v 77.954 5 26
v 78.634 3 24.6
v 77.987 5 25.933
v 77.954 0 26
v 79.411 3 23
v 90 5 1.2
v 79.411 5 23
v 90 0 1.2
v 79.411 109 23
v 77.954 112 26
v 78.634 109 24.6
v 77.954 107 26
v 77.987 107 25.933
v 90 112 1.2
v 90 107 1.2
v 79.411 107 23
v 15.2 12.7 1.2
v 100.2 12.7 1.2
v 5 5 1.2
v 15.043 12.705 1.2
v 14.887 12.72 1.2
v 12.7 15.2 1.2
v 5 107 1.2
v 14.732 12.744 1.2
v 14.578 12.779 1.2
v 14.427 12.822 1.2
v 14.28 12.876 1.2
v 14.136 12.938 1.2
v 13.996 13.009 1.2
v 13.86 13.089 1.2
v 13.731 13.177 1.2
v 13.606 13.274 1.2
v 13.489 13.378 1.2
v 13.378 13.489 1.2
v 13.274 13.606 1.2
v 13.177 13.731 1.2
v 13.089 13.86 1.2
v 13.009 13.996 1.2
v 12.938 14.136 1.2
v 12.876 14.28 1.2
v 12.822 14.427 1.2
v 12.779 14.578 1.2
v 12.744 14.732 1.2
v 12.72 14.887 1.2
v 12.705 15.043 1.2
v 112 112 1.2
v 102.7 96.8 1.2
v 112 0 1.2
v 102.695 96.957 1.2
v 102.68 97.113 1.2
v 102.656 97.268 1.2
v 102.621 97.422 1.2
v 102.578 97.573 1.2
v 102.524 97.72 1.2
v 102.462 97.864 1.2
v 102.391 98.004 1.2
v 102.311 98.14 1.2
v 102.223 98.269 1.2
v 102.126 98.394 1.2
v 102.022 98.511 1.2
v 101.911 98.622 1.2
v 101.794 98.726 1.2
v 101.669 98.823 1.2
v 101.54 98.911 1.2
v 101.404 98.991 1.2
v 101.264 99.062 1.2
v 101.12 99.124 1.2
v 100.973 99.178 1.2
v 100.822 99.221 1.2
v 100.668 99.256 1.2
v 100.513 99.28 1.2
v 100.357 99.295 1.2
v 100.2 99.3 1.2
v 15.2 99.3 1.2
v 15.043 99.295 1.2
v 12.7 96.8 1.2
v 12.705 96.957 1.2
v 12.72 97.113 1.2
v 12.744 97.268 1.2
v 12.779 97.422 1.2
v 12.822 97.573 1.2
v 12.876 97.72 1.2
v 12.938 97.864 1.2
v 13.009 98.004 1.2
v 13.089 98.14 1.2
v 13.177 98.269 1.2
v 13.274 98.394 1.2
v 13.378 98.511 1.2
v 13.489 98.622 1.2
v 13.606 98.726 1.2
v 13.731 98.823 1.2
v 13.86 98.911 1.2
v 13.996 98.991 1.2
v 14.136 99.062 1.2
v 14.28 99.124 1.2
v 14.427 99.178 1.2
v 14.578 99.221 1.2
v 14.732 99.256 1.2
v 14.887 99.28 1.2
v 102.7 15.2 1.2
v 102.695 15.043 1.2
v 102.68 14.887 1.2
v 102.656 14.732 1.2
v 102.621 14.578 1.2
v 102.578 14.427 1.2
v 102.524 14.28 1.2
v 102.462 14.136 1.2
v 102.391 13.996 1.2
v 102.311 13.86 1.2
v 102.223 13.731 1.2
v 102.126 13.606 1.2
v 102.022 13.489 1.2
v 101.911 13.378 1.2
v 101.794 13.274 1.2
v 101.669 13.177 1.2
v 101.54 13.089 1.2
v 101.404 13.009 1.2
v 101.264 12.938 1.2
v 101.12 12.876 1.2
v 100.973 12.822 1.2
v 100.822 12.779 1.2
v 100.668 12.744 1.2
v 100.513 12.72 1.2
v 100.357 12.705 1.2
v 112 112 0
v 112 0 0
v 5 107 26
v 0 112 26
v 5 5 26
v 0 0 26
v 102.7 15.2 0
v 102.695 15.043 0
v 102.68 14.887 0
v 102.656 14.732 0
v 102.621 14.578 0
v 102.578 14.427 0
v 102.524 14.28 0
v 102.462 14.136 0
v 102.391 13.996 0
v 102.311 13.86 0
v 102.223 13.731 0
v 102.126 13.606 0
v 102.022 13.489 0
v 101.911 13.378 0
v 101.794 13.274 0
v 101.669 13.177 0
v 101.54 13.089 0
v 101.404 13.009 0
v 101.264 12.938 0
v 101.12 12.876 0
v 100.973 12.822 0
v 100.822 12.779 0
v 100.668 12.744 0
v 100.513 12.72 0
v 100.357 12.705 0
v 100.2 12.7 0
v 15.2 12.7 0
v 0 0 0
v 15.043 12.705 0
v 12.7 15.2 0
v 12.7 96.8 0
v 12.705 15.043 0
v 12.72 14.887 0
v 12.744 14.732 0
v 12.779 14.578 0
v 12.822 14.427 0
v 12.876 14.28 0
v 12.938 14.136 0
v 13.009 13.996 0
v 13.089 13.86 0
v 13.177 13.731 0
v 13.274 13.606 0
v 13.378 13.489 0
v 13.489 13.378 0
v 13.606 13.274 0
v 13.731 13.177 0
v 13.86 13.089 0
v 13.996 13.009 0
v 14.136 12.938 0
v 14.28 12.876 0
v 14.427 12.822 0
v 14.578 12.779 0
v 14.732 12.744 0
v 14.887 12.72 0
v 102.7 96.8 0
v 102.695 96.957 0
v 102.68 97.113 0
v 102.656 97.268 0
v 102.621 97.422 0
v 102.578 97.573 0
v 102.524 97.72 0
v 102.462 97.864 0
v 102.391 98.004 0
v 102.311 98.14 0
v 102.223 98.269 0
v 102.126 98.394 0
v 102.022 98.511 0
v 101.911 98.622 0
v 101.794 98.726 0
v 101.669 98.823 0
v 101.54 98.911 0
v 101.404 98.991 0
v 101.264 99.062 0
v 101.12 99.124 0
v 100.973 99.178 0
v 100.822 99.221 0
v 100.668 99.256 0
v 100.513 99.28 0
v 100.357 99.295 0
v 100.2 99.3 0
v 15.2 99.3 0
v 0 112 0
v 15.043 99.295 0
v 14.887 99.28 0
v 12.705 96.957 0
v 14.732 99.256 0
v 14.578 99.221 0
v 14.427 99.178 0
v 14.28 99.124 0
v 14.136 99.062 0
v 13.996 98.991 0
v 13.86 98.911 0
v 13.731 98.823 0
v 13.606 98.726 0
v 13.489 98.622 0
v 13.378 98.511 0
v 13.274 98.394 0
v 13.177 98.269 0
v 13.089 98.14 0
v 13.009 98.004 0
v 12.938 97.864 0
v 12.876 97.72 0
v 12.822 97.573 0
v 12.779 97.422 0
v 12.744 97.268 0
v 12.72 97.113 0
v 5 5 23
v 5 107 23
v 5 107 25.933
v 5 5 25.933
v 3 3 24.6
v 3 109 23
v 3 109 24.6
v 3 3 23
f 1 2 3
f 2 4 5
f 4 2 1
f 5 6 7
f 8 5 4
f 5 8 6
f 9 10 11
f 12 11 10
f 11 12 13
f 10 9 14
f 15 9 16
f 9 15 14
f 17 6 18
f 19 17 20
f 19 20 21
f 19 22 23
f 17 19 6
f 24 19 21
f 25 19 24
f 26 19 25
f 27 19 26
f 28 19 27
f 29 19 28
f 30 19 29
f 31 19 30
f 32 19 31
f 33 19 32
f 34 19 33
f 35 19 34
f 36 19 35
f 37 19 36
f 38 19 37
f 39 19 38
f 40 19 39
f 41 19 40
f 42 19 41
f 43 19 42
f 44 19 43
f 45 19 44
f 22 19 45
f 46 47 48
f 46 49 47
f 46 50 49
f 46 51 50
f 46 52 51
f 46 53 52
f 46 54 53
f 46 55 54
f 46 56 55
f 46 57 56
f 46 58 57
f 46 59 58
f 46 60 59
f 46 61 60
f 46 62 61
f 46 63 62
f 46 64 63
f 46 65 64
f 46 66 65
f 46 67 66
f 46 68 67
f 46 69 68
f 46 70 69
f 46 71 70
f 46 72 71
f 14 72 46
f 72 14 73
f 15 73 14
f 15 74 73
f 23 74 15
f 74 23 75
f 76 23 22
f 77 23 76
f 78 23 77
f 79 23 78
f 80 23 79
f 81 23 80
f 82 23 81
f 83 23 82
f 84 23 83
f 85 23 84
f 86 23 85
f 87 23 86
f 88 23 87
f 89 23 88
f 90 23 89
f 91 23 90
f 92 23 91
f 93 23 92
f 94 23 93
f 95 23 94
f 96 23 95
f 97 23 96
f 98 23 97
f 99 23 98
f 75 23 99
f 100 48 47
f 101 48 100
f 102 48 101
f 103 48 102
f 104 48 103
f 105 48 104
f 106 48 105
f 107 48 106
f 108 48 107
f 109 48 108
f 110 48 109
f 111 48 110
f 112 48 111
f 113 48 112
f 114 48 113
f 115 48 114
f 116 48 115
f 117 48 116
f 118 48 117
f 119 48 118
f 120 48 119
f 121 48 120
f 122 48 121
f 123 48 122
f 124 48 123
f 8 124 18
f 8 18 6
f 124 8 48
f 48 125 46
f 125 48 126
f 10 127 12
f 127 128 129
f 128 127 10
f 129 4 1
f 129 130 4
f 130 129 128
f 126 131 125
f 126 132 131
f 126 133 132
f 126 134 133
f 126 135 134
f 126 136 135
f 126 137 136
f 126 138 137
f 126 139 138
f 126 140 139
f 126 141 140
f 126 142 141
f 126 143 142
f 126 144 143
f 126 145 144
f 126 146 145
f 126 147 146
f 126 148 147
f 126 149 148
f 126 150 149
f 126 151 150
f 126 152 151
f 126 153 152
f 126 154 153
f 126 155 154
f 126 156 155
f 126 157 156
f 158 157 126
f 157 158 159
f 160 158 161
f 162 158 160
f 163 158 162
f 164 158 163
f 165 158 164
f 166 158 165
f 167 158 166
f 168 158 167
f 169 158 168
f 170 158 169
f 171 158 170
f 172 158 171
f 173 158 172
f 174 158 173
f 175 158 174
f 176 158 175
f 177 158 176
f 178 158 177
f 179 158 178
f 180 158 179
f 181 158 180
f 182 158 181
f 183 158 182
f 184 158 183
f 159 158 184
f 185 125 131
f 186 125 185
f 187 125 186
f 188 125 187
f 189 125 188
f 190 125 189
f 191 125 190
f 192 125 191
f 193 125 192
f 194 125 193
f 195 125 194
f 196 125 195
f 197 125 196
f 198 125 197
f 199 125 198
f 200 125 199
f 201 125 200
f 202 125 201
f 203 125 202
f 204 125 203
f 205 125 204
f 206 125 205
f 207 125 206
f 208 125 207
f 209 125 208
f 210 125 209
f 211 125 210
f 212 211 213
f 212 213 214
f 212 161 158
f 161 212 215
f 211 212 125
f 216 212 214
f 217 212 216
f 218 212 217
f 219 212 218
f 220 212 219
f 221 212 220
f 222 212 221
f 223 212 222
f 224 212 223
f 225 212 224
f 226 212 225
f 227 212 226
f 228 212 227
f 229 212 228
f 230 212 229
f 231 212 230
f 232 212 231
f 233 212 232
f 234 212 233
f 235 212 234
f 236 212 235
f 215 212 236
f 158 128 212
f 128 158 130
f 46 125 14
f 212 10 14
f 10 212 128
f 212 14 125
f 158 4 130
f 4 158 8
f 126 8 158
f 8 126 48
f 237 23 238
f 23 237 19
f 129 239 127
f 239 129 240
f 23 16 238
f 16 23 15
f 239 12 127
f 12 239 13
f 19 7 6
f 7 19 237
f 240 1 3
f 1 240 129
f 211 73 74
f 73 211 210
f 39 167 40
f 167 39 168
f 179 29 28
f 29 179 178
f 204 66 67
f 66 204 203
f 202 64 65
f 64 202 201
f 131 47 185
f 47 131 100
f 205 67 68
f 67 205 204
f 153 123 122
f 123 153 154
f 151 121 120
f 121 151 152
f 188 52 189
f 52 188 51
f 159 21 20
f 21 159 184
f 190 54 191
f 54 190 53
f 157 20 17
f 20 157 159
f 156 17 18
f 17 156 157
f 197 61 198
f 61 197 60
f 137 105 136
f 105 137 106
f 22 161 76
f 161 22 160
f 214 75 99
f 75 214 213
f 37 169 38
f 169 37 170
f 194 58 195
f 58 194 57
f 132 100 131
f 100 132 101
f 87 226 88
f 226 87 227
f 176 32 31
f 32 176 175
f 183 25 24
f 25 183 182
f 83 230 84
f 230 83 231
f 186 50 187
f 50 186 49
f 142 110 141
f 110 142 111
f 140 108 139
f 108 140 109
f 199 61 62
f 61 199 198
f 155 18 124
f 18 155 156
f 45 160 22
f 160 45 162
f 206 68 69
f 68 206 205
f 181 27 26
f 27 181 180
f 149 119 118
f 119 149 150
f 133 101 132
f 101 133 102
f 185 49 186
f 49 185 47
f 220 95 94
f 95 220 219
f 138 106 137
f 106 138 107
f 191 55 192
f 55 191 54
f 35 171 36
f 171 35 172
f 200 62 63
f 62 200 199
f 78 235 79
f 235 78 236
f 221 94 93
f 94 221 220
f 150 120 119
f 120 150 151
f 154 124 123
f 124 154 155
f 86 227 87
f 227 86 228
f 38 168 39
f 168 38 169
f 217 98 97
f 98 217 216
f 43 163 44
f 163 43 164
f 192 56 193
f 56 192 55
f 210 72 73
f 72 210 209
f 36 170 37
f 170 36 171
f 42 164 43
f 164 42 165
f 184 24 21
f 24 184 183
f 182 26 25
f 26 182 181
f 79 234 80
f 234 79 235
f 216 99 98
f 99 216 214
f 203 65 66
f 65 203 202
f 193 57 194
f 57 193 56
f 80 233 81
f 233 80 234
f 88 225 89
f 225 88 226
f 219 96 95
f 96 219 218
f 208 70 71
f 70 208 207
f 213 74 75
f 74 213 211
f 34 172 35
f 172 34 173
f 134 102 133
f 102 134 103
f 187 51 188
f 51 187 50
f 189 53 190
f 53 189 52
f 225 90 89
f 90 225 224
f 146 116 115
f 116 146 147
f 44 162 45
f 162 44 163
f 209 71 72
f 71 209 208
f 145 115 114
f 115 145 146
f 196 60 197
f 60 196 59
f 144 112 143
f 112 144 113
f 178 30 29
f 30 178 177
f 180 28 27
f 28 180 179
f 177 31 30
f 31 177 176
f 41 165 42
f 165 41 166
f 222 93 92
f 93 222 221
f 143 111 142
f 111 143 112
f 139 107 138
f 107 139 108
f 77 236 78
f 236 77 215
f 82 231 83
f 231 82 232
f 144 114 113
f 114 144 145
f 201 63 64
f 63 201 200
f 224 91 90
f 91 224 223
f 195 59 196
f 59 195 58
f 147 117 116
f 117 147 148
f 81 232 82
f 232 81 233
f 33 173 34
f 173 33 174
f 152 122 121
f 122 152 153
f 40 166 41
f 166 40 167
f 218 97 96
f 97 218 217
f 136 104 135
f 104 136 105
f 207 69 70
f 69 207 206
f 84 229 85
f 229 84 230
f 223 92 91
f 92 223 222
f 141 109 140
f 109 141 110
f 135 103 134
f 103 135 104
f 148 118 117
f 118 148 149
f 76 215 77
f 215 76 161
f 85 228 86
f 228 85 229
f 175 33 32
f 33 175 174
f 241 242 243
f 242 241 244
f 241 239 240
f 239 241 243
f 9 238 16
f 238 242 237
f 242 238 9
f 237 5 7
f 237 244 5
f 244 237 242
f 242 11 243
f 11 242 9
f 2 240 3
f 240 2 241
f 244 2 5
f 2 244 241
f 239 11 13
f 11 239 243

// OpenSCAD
// Wobble (added to width, height and depth)
wobble = 2;
// Token width
width = 100;
// Token length
length = 100;
// Token stack depth
height = 19;
// The font you want to use
fontname = "Slabo 27px"; // [Slabo 27px,Oswald,Indie Flower,Yanone Kaffeesatz,Titillium Web,Arvo,Lobster,Fjalla One,Bree Serif,Muli,Pacifico,Anton,Maven Pro,Monda,Lobster Two,Bangers,Sigmar One,Courgette,Fugaz One,Patrick Hand,Viga,Fredoka One,Damion,Audiowide,Black Ops One,Montserrat Alternates,Jockey One,Lily Script One]
// Title 1
text1 = "Q5 - SALLES DES QUETES";
// Title 1 size
size1 = 8.8;
// Title 1 offset
offset1 = -1.4;
// Title 2
text2 = "";
// Title 2 size
size2 = 10;
// Title 2 offset
offset2 = 0;
// Space between characters
tspace = 1.1;
// Number of holes on the lid
holes = 0; // [0,1,4]
// Number of holes on the bottom part
bholes = 1; // [0,1,4]
// Style of opening
frontopening = 1; // [0:Top opening,1:Front+top opening]
// Print bottom or lid
print = 0; // [0:Bottom,1:Lid]
// Total reduction of the width of the lid (so that it fits)
topreduc = 0.1;


innerx = length + wobble;
innery = width + wobble;
innerz = height + wobble;
fonttype = str(fontname);

module bottom(topdiff=0){
if (frontopening==0){
if (text2=="") {
    #translate([innerx+9,innery/2+4,innerz/2+3.5+offset1]) rotate([90,0,90]) linear_extrude(height = 2, center = false, convexity = 10) text(text1,size1,font=fonttype,valign="center",halign="center",spacing=tspace);    
   
    
    } else {
    #translate([innerx+9,innery/2+4,innerz/2+3.5+6+offset1]) rotate([90,0,90]) linear_extrude(height = 2, center = false, convexity = 10) text(text1,size1,font=fonttype,valign="center",halign="center",spacing=tspace);            
    
#translate([innerx+9,innery/2+4,innerz/2-5+offset2]) rotate([90,0,90]) linear_extrude(height = 2, center = false, convexity = 10) text(text2,size2,font=fonttype,valign="center",halign="center",spacing=tspace); 
    }
}    
union(){
 /*   difference(){
        translate([6,2,innerz]) cylinder($fn=100,d=5,h=4.5);
        translate([6,-2,innerz]) cylinder($fn=100,d=5,h=4.5);
    }
    difference(){
        translate([6,8+innery,innerz]) cylinder($fn=100,d=5,h=4.5);
        translate([6,12+innery,innerz]) cylinder($fn=100,d=5,h=4.5);
    }
    */
    difference(){
        cube([innerx+10,innery+10+topdiff,innerz+5]);
        translate([5,5,1.2]) cube([innerx,innery-topdiff,innerz+1]);
        
         translate([5,5,1.2+innerz]) cube([innerx,innery-topdiff,innerz+1]);
        /*translate([5+innerx*0.15,5+innery*0.15,-1.2]) minkowski() {
        cube([innerx*0.7,innery*0.7-topdiff,innerz+1]);
        cylinder($fn=100,r=width/12,h=1);
    }*/
if (bholes==4){
        translate([5+innerx/10,5+innery/10,-0.1]) minkowski() {
            cube([innerx/3,innery/3,innerz]);
            cylinder($fn=100,h=1,d=width/20);
        }
        translate([5+innerx/10,5+innery/1.78,-0.1]) minkowski() {
            cube([innerx/3,innery/3,innerz]);
            cylinder($fn=100,h=1,d=width/20);
        }
        translate([5+innerx/1.78,5+innery/10,-0.1]) minkowski() {
            cube([innerx/3,innery/3,innerz]);
            cylinder($fn=100,h=1,d=width/20);
        }
        translate([5+innerx/1.78,5+innery/1.78,-0.1]) minkowski() {
            cube([innerx/3,innery/3,innerz]);
            cylinder($fn=100,h=1,d=width/20);
        }
    }
    if (bholes==1){   
        translate([5+innerx/10,5+innery/10,-0.1]) minkowski() {
            cube([innerx/1.2,innery/1.25,innerz]);
            cylinder($fn=100,h=1,d=width/20);
        }
    }
        hull(){    
        translate([3,3,innerz+2]) cube([innerx,innery-topdiff+4,1.6]);
        translate([6,6,innerz+4]) cube([innerx-6,innery-topdiff-2,1.6]);
        }
if (frontopening==1){        
        translate([5+innerx/1.2,-1,1.2]) rotate([0,-atan(innerx/(innerz*10)),0]) cube([innerx,innery+20-topdiff,innerx]);
        translate([5+innerx/1.2,-1,1.2]) cube([innerx,innery+20-topdiff,innerz*3]);
}
else
{
        //translate([5+innerx/1.2,-1,1.2]) rotate([0,-atan(innerx/(innerz*10)),0]) cube([innerx,innery+20-topdiff,innerz*3]);
        translate([innerx,-1,innerz+2]) cube([innerx,innery+20-topdiff,innerz*3]);
}
    }
    //translate([10,2.7,innerz-4]) cylinder(d=2,h=10,$fn=100);
    //translate([10,7.1+innery-topdiff,innerz-4]) cylinder(d=2,h=10,$fn=100);
    }
}


module top(topdiff=0){
if (frontopening==1){
if (text2=="") {
    #translate([innerx+9,innery/2+4,innerz/2+3.5+offset1]) rotate([90,0,90]) linear_extrude(height = 2, center = false, convexity = 10) text(text1,size1,font=fonttype,valign="center",halign="center",spacing=tspace);    
    } else {
    #translate([innerx+9,innery/2+4,innerz/2+3.5+6+offset1]) rotate([90,0,90]) linear_extrude(height = 2, center = false, convexity = 10) text(text1,size1,font=fonttype,valign="center",halign="center",spacing=tspace);            
    
#translate([innerx+9,innery/2+4,innerz/2-5+offset2]) rotate([90,0,90]) linear_extrude(height = 2, center = false, convexity = 10) text(text2,size2,font=fonttype,valign="center",halign="center",spacing=tspace); 
    }
}
    
    
    
    difference() {
        union(){
            intersection(){
                translate([0,0,innerz+2]) cube([innerx+10,innery+10-topdiff,1.2]);
    translate([3,3+topreduc/2,innerz+2]) cube([innerx+5,innery+4-topreduc,1.2]);
            }
            difference(){
                intersection(){
if (frontopening==1)
{
                    translate([0,0,1.4]) cube([innerx+10,innery+10+topdiff,innerz+1.8]);
}
else
{
    difference()
    {
        translate([0,0,1.4]) cube([innerx+10,innery+10+topdiff,innerz+1.4+2.2]);
        translate([5,5,1.2+innerz]) cube([innerx,innery-topdiff,innerz+1]);
    }
}
                        union(){
if (frontopening==1){
                            translate([5+innerx/1.2,-1,1.2]) rotate([0,-atan(innerx/(innerz*10)),0]) cube([innerx,innery+20-topdiff,innerz*3]);
    translate([5+innerx/1.2,-1,1.2]) cube([innerx,innery+20-topdiff,innerz*3]);
}
else
{
    translate([innerx,-1,innerz+2]) cube([innerx,innery+20-topdiff,innerz*3]);
}
                            
                        }
                }
    translate([5,5,1.2]) cube([innerx,innery-topdiff,innerz+1]);
            }
        }
if (holes==4){        
        translate([5+innerx/10,5+innery/10,0]) minkowski() {
            cube([innerx/3,innery/3,innerz+10]);
            cylinder($fn=100,h=1,d=width/20);
        }
        translate([5+innerx/10,5+innery/1.78,0]) minkowski() {
            cube([innerx/3,innery/3,innerz+10]);
            cylinder($fn=100,h=1,d=width/20);
        }
        translate([5+innerx/1.78,5+innery/10,0]) minkowski() {
            cube([innerx/3,innery/3,innerz+10]);
            cylinder($fn=100,h=1,d=width/20);
        }
        translate([5+innerx/1.78,5+innery/1.78,0]) minkowski() {
            cube([innerx/3,innery/3,innerz+10]);
            cylinder($fn=100,h=1,d=width/20);
        }
    }
    if (holes==1){   
        translate([5+innerx/10,5+innery/10,0]) minkowski() {
            cube([innerx/1.2,innery/1.25,innerz+10]);
            cylinder($fn=100,h=1,d=width/20);
        }
    }
        //translate([0,0,0]) bottom();
        //translate([0,0.2,0]) bottom(0.4);
        translate([-2,-5.2+topreduc/2,innerz-4]) rotate([0,0,-10]) cube([10,10,10]);
    translate([0,innery+5.3-topreduc/2,innerz-4]) rotate([0,0,10]) cube([10,10,10]);
    }
}
if (print==1){
if (frontopening==0){
translate([100,0,0]) top();
}
else
{
    translate([100,0,0]) rotate([0,180,0]) top();
}
}
else
{
bottom();
}
if (print=="p"){
    bottom();
    translate([0,0,0]) top();
}
if (print=="po"){
    bottom();
    translate([50,0,0]) top();
}
